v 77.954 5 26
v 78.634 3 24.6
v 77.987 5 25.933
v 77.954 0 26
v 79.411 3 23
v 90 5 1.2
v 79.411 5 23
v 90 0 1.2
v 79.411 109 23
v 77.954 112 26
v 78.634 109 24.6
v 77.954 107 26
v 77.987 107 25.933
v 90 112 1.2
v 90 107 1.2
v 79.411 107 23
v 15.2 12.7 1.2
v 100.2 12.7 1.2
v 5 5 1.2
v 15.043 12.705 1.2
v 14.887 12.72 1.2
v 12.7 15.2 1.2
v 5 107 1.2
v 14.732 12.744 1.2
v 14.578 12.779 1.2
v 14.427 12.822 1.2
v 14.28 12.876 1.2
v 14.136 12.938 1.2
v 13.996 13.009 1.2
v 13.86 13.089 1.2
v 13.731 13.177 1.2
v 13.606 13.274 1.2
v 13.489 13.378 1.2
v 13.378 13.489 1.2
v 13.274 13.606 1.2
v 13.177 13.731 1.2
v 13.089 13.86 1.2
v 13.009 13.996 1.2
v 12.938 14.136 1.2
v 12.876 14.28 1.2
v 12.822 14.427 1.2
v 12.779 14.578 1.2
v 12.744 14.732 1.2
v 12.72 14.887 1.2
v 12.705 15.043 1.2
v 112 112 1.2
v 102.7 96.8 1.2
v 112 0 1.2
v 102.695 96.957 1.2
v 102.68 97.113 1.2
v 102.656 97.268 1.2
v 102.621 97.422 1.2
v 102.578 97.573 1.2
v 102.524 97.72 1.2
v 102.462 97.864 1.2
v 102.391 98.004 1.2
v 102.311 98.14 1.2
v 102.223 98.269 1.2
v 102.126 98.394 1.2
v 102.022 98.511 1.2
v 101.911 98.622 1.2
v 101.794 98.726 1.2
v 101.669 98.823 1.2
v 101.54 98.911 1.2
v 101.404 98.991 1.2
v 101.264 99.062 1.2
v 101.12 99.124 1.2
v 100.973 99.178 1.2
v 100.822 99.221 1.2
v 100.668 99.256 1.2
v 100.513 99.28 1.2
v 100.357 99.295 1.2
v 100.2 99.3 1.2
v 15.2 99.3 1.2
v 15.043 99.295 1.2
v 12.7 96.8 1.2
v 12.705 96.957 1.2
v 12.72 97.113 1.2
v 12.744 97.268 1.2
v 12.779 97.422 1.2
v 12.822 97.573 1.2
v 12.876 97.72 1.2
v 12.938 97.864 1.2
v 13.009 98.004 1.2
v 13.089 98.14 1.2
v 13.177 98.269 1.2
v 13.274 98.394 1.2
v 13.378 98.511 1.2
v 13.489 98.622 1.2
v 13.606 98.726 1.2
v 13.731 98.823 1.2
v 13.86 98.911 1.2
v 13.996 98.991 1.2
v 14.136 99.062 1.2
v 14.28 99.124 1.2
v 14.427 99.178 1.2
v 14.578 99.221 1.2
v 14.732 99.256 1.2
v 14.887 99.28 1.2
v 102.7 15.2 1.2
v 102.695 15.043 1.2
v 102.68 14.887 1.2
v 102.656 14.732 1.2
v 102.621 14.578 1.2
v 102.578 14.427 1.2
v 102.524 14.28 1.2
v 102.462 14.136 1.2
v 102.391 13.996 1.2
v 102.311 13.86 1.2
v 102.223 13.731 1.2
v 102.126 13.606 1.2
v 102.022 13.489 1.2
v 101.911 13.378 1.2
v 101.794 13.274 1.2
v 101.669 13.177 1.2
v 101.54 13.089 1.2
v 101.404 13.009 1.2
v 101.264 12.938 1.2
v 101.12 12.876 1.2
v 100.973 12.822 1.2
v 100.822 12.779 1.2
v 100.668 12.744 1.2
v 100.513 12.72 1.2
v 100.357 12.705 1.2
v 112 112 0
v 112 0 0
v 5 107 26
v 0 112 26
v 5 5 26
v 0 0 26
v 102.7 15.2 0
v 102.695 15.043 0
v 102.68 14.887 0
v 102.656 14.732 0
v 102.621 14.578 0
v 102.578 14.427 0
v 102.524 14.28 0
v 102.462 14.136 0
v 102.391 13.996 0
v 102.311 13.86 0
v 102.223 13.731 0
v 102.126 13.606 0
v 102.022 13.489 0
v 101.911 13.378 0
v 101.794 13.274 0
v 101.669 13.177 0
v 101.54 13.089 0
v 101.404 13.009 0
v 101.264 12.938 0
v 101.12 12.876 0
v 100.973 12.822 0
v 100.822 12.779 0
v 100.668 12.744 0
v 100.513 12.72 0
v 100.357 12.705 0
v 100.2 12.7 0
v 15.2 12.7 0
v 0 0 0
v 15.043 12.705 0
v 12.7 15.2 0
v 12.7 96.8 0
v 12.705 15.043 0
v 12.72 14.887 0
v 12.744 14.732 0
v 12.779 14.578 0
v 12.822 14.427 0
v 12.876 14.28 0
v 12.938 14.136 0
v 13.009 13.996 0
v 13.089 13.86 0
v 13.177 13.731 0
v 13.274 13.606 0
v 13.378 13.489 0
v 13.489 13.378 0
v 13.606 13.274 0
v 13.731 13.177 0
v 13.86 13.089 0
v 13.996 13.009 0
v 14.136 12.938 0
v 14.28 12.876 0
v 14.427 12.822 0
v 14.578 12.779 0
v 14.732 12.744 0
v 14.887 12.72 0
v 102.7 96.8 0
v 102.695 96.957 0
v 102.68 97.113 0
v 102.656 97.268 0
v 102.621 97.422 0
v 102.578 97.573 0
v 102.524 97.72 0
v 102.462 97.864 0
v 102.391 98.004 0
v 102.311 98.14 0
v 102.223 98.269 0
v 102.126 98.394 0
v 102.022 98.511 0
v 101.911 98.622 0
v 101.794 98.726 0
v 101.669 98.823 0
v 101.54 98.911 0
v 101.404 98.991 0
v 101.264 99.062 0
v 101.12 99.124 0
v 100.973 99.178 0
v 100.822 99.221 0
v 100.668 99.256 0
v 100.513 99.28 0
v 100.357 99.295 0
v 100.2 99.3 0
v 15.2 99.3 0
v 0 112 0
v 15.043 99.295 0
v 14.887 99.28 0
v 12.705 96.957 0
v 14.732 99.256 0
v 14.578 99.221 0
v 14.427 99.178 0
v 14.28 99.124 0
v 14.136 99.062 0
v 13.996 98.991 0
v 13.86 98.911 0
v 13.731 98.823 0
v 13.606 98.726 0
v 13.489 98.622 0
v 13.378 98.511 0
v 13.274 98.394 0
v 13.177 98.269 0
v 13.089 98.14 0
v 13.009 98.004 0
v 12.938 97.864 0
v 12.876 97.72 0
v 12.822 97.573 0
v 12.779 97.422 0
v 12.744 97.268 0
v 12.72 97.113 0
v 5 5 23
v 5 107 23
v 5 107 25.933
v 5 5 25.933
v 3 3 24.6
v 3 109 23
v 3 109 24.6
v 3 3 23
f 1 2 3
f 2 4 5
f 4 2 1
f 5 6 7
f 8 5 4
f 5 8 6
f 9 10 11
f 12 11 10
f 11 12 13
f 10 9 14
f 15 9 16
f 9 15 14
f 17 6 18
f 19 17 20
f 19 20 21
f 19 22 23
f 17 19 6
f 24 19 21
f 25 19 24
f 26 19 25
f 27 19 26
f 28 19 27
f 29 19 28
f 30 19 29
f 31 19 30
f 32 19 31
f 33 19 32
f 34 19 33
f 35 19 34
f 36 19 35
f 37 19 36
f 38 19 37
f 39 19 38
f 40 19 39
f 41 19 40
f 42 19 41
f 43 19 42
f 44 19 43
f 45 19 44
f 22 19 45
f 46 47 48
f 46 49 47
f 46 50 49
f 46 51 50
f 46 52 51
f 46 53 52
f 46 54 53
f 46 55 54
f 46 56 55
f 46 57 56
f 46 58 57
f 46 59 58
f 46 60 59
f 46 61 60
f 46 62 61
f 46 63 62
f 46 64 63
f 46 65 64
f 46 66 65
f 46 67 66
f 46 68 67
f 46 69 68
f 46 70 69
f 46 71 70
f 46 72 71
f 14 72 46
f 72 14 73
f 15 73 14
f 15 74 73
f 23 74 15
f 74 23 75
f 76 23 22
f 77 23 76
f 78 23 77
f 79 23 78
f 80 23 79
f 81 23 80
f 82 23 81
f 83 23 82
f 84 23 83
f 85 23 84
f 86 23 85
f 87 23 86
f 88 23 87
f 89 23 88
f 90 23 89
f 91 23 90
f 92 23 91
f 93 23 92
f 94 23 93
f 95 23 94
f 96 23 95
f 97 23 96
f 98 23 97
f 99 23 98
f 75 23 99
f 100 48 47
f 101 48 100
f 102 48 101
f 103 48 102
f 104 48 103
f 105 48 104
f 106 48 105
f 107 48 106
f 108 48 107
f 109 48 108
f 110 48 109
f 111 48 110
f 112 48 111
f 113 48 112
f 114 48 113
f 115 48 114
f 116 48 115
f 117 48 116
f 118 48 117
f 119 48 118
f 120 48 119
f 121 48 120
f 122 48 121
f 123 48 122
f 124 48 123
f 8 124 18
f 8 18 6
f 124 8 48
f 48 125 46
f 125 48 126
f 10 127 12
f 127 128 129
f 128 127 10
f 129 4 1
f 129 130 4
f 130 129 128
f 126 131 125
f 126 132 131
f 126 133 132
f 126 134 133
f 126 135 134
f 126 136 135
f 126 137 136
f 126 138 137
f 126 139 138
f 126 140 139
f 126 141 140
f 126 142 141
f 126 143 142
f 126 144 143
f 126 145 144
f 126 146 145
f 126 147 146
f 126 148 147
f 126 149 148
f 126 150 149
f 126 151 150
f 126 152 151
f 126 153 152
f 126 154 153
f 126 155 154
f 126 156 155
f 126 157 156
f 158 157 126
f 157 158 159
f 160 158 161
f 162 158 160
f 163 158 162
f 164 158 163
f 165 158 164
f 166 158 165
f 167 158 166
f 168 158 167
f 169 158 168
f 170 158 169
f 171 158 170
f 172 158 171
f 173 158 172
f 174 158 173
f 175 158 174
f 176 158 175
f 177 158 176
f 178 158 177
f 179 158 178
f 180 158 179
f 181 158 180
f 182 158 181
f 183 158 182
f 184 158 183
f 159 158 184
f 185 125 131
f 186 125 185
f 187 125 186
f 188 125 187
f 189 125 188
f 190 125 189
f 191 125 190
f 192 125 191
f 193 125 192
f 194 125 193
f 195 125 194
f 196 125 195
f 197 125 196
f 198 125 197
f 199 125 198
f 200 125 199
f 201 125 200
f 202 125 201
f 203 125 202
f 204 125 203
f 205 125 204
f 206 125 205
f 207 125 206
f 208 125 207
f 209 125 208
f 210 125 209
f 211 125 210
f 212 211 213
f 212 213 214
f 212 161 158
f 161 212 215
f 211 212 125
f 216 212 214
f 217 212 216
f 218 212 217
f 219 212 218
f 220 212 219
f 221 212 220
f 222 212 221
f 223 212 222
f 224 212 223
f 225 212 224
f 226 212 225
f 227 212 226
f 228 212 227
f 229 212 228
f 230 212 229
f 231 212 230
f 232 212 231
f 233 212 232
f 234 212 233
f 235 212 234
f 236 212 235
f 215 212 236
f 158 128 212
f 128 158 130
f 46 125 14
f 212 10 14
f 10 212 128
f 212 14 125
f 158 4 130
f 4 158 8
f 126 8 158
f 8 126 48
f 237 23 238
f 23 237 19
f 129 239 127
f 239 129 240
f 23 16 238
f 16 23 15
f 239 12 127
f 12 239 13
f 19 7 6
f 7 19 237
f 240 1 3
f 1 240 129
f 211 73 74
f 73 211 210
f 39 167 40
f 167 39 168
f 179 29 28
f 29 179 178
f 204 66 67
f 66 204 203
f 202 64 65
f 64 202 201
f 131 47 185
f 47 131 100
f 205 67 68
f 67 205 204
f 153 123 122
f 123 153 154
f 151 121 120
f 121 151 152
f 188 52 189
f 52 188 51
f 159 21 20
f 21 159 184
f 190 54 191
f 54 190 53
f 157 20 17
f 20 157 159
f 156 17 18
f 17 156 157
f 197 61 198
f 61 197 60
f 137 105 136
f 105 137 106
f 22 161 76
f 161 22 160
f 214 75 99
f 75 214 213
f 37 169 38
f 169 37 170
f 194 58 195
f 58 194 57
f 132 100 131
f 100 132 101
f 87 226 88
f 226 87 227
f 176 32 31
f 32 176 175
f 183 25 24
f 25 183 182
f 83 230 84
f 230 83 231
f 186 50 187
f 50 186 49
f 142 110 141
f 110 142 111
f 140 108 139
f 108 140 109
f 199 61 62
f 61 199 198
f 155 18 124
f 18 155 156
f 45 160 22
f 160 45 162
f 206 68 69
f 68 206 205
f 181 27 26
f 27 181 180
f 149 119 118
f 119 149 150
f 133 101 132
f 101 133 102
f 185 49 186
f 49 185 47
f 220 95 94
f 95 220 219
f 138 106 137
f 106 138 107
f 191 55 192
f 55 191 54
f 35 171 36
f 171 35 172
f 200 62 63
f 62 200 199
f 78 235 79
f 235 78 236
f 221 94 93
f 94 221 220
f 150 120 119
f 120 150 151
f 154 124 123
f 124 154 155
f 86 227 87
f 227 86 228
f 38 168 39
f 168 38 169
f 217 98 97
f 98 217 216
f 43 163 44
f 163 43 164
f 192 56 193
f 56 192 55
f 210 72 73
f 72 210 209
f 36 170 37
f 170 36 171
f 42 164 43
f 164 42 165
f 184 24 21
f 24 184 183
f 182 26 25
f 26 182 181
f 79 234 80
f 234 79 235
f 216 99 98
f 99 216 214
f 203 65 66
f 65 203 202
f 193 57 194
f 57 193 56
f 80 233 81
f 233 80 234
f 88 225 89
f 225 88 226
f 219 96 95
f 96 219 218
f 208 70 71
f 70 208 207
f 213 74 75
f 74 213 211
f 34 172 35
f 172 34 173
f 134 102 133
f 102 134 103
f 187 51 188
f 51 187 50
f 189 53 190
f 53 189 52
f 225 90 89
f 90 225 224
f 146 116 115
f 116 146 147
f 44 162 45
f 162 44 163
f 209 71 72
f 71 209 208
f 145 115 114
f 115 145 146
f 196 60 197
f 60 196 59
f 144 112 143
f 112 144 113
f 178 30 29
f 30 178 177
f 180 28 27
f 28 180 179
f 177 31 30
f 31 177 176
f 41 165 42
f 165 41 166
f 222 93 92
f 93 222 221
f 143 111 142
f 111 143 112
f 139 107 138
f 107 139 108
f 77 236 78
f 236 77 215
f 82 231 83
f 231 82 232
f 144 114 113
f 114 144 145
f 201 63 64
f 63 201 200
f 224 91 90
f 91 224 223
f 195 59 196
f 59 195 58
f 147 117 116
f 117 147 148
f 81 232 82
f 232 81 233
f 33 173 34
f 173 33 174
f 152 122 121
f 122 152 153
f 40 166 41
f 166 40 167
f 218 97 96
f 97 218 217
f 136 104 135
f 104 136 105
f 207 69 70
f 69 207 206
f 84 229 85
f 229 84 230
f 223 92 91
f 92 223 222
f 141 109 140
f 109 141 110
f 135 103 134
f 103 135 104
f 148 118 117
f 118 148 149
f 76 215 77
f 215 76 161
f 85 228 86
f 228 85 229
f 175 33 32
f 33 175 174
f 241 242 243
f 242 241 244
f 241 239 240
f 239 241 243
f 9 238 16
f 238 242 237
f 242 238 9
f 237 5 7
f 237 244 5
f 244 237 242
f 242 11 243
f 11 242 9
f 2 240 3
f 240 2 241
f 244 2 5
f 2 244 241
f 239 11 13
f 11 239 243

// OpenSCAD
// Wobble (added to width, height and depth)
wobble = 2;
// Token width
width = 100;
// Token length
length = 100;
// Token stack depth
height = 19;
// The font you want to use
fontname = "Slabo 27px"; // [Slabo 27px,Oswald,Indie Flower,Yanone Kaffeesatz,Titillium Web,Arvo,Lobster,Fjalla One,Bree Serif,Muli,Pacifico,Anton,Maven Pro,Monda,Lobster Two,Bangers,Sigmar One,Courgette,Fugaz One,Patrick Hand,Viga,Fredoka One,Damion,Audiowide,Black Ops One,Montserrat Alternates,Jockey One,Lily Script One]
// Title 1
text1 = "Q5 - SALLES DES QUETES";
// Title 1 size
size1 = 8.8;
// Title 1 offset
offset1 = -1.4;
// Title 2
text2 = "";
// Title 2 size
size2 = 10;
// Title 2 offset
offset2 = 0;
// Space between characters
tspace = 1.1;
// Number of holes on the lid
holes = 0; // [0,1,4]
// Number of holes on the bottom part
bholes = 1; // [0,1,4]
// Style of opening
frontopening = 1; // [0:Top opening,1:Front+top opening]
// Print bottom or lid
print = 0; // [0:Bottom,1:Lid]
// Total reduction of the width of the lid (so that it fits)
topreduc = 0.1;


innerx = length + wobble;
innery = width + wobble;
innerz = height + wobble;
fonttype = str(fontname);

module bottom(topdiff=0){
if (frontopening==0){
if (text2=="") {
    #translate([innerx+9,innery/2+4,innerz/2+3.5+offset1]) rotate([90,0,90]) linear_extrude(height = 2, center = false, convexity = 10) text(text1,size1,font=fonttype,valign="center",halign="center",spacing=tspace);    
   
    
    } else {
    #translate([innerx+9,innery/2+4,innerz/2+3.5+6+offset1]) rotate([90,0,90]) linear_extrude(height = 2, center = false, convexity = 10) text(text1,size1,font=fonttype,valign="center",halign="center",spacing=tspace);            
    
#translate([innerx+9,innery/2+4,innerz/2-5+offset2]) rotate([90,0,90]) linear_extrude(height = 2, center = false, convexity = 10) text(text2,size2,font=fonttype,valign="center",halign="center",spacing=tspace); 
    }
}    
union(){
 /*   difference(){
        translate([6,2,innerz]) cylinder($fn=100,d=5,h=4.5);
        translate([6,-2,innerz]) cylinder($fn=100,d=5,h=4.5);
    }
    difference(){
        translate([6,8+innery,innerz]) cylinder($fn=100,d=5,h=4.5);
        translate([6,12+innery,innerz]) cylinder($fn=100,d=5,h=4.5);
    }
    */
    difference(){
        cube([innerx+10,innery+10+topdiff,innerz+5]);
        translate([5,5,1.2]) cube([innerx,innery-topdiff,innerz+1]);
        
         translate([5,5,1.2+innerz]) cube([innerx,innery-topdiff,innerz+1]);
        /*translate([5+innerx*0.15,5+innery*0.15,-1.2]) minkowski() {
        cube([innerx*0.7,innery*0.7-topdiff,innerz+1]);
        cylinder($fn=100,r=width/12,h=1);
    }*/
if (bholes==4){
        translate([5+innerx/10,5+innery/10,-0.1]) minkowski() {
            cube([innerx/3,innery/3,innerz]);
            cylinder($fn=100,h=1,d=width/20);
        }
        translate([5+innerx/10,5+innery/1.78,-0.1]) minkowski() {
            cube([innerx/3,innery/3,innerz]);
            cylinder($fn=100,h=1,d=width/20);
        }
        translate([5+innerx/1.78,5+innery/10,-0.1]) minkowski() {
            cube([innerx/3,innery/3,innerz]);
            cylinder($fn=100,h=1,d=width/20);
        }
        translate([5+innerx/1.78,5+innery/1.78,-0.1]) minkowski() {
            cube([innerx/3,innery/3,innerz]);
            cylinder($fn=100,h=1,d=width/20);
        }
    }
    if (bholes==1){   
        translate([5+innerx/10,5+innery/10,-0.1]) minkowski() {
            cube([innerx/1.2,innery/1.25,innerz]);
            cylinder($fn=100,h=1,d=width/20);
        }
    }
        hull(){    
        translate([3,3,innerz+2]) cube([innerx,innery-topdiff+4,1.6]);
        translate([6,6,innerz+4]) cube([innerx-6,innery-topdiff-2,1.6]);
        }
if (frontopening==1){        
        translate([5+innerx/1.2,-1,1.2]) rotate([0,-atan(innerx/(innerz*10)),0]) cube([innerx,innery+20-topdiff,innerx]);
        translate([5+innerx/1.2,-1,1.2]) cube([innerx,innery+20-topdiff,innerz*3]);
}
else
{
        //translate([5+innerx/1.2,-1,1.2]) rotate([0,-atan(innerx/(innerz*10)),0]) cube([innerx,innery+20-topdiff,innerz*3]);
        translate([innerx,-1,innerz+2]) cube([innerx,innery+20-topdiff,innerz*3]);
}
    }
    //translate([10,2.7,innerz-4]) cylinder(d=2,h=10,$fn=100);
    //translate([10,7.1+innery-topdiff,innerz-4]) cylinder(d=2,h=10,$fn=100);
    }
}


module top(topdiff=0){
if (frontopening==1){
if (text2=="") {
    #translate([innerx+9,innery/2+4,innerz/2+3.5+offset1]) rotate([90,0,90]) linear_extrude(height = 2, center = false, convexity = 10) text(text1,size1,font=fonttype,valign="center",halign="center",spacing=tspace);    
    } else {
    #translate([innerx+9,innery/2+4,innerz/2+3.5+6+offset1]) rotate([90,0,90]) linear_extrude(height = 2, center = false, convexity = 10) text(text1,size1,font=fonttype,valign="center",halign="center",spacing=tspace);            
    
#translate([innerx+9,innery/2+4,innerz/2-5+offset2]) rotate([90,0,90]) linear_extrude(height = 2, center = false, convexity = 10) text(text2,size2,font=fonttype,valign="center",halign="center",spacing=tspace); 
    }
}
    
    
    
    difference() {
        union(){
            intersection(){
                translate([0,0,innerz+2]) cube([innerx+10,innery+10-topdiff,1.2]);
    translate([3,3+topreduc/2,innerz+2]) cube([innerx+5,innery+4-topreduc,1.2]);
            }
            difference(){
                intersection(){
if (frontopening==1)
{
                    translate([0,0,1.4]) cube([innerx+10,innery+10+topdiff,innerz+1.8]);
}
else
{
    difference()
    {
        translate([0,0,1.4]) cube([innerx+10,innery+10+topdiff,innerz+1.4+2.2]);
        translate([5,5,1.2+innerz]) cube([innerx,innery-topdiff,innerz+1]);
    }
}
                        union(){
if (frontopening==1){
                            translate([5+innerx/1.2,-1,1.2]) rotate([0,-atan(innerx/(innerz*10)),0]) cube([innerx,innery+20-topdiff,innerz*3]);
    translate([5+innerx/1.2,-1,1.2]) cube([innerx,innery+20-topdiff,innerz*3]);
}
else
{
    translate([innerx,-1,innerz+2]) cube([innerx,innery+20-topdiff,innerz*3]);
}
                            
                        }
                }
    translate([5,5,1.2]) cube([innerx,innery-topdiff,innerz+1]);
            }
        }
if (holes==4){        
        translate([5+innerx/10,5+innery/10,0]) minkowski() {
            cube([innerx/3,innery/3,innerz+10]);
            cylinder($fn=100,h=1,d=width/20);
        }
        translate([5+innerx/10,5+innery/1.78,0]) minkowski() {
            cube([innerx/3,innery/3,innerz+10]);
            cylinder($fn=100,h=1,d=width/20);
        }
        translate([5+innerx/1.78,5+innery/10,0]) minkowski() {
            cube([innerx/3,innery/3,innerz+10]);
            cylinder($fn=100,h=1,d=width/20);
        }
        translate([5+innerx/1.78,5+innery/1.78,0]) minkowski() {
            cube([innerx/3,innery/3,innerz+10]);
            cylinder($fn=100,h=1,d=width/20);
        }
    }
    if (holes==1){   
        translate([5+innerx/10,5+innery/10,0]) minkowski() {
            cube([innerx/1.2,innery/1.25,innerz+10]);
            cylinder($fn=100,h=1,d=width/20);
        }
    }
        //translate([0,0,0]) bottom();
        //translate([0,0.2,0]) bottom(0.4);
        translate([-2,-5.2+topreduc/2,innerz-4]) rotate([0,0,-10]) cube([10,10,10]);
    translate([0,innery+5.3-topreduc/2,innerz-4]) rotate([0,0,10]) cube([10,10,10]);
    }
}
if (print==1){
if (frontopening==0){
translate([100,0,0]) top();
}
else
{
    translate([100,0,0]) rotate([0,180,0]) top();
}
}
else
{
bottom();
}
if (print=="p"){
    bottom();
    translate([0,0,0]) top();
}
if (print=="po"){
    bottom();
    translate([50,0,0]) top();
}
